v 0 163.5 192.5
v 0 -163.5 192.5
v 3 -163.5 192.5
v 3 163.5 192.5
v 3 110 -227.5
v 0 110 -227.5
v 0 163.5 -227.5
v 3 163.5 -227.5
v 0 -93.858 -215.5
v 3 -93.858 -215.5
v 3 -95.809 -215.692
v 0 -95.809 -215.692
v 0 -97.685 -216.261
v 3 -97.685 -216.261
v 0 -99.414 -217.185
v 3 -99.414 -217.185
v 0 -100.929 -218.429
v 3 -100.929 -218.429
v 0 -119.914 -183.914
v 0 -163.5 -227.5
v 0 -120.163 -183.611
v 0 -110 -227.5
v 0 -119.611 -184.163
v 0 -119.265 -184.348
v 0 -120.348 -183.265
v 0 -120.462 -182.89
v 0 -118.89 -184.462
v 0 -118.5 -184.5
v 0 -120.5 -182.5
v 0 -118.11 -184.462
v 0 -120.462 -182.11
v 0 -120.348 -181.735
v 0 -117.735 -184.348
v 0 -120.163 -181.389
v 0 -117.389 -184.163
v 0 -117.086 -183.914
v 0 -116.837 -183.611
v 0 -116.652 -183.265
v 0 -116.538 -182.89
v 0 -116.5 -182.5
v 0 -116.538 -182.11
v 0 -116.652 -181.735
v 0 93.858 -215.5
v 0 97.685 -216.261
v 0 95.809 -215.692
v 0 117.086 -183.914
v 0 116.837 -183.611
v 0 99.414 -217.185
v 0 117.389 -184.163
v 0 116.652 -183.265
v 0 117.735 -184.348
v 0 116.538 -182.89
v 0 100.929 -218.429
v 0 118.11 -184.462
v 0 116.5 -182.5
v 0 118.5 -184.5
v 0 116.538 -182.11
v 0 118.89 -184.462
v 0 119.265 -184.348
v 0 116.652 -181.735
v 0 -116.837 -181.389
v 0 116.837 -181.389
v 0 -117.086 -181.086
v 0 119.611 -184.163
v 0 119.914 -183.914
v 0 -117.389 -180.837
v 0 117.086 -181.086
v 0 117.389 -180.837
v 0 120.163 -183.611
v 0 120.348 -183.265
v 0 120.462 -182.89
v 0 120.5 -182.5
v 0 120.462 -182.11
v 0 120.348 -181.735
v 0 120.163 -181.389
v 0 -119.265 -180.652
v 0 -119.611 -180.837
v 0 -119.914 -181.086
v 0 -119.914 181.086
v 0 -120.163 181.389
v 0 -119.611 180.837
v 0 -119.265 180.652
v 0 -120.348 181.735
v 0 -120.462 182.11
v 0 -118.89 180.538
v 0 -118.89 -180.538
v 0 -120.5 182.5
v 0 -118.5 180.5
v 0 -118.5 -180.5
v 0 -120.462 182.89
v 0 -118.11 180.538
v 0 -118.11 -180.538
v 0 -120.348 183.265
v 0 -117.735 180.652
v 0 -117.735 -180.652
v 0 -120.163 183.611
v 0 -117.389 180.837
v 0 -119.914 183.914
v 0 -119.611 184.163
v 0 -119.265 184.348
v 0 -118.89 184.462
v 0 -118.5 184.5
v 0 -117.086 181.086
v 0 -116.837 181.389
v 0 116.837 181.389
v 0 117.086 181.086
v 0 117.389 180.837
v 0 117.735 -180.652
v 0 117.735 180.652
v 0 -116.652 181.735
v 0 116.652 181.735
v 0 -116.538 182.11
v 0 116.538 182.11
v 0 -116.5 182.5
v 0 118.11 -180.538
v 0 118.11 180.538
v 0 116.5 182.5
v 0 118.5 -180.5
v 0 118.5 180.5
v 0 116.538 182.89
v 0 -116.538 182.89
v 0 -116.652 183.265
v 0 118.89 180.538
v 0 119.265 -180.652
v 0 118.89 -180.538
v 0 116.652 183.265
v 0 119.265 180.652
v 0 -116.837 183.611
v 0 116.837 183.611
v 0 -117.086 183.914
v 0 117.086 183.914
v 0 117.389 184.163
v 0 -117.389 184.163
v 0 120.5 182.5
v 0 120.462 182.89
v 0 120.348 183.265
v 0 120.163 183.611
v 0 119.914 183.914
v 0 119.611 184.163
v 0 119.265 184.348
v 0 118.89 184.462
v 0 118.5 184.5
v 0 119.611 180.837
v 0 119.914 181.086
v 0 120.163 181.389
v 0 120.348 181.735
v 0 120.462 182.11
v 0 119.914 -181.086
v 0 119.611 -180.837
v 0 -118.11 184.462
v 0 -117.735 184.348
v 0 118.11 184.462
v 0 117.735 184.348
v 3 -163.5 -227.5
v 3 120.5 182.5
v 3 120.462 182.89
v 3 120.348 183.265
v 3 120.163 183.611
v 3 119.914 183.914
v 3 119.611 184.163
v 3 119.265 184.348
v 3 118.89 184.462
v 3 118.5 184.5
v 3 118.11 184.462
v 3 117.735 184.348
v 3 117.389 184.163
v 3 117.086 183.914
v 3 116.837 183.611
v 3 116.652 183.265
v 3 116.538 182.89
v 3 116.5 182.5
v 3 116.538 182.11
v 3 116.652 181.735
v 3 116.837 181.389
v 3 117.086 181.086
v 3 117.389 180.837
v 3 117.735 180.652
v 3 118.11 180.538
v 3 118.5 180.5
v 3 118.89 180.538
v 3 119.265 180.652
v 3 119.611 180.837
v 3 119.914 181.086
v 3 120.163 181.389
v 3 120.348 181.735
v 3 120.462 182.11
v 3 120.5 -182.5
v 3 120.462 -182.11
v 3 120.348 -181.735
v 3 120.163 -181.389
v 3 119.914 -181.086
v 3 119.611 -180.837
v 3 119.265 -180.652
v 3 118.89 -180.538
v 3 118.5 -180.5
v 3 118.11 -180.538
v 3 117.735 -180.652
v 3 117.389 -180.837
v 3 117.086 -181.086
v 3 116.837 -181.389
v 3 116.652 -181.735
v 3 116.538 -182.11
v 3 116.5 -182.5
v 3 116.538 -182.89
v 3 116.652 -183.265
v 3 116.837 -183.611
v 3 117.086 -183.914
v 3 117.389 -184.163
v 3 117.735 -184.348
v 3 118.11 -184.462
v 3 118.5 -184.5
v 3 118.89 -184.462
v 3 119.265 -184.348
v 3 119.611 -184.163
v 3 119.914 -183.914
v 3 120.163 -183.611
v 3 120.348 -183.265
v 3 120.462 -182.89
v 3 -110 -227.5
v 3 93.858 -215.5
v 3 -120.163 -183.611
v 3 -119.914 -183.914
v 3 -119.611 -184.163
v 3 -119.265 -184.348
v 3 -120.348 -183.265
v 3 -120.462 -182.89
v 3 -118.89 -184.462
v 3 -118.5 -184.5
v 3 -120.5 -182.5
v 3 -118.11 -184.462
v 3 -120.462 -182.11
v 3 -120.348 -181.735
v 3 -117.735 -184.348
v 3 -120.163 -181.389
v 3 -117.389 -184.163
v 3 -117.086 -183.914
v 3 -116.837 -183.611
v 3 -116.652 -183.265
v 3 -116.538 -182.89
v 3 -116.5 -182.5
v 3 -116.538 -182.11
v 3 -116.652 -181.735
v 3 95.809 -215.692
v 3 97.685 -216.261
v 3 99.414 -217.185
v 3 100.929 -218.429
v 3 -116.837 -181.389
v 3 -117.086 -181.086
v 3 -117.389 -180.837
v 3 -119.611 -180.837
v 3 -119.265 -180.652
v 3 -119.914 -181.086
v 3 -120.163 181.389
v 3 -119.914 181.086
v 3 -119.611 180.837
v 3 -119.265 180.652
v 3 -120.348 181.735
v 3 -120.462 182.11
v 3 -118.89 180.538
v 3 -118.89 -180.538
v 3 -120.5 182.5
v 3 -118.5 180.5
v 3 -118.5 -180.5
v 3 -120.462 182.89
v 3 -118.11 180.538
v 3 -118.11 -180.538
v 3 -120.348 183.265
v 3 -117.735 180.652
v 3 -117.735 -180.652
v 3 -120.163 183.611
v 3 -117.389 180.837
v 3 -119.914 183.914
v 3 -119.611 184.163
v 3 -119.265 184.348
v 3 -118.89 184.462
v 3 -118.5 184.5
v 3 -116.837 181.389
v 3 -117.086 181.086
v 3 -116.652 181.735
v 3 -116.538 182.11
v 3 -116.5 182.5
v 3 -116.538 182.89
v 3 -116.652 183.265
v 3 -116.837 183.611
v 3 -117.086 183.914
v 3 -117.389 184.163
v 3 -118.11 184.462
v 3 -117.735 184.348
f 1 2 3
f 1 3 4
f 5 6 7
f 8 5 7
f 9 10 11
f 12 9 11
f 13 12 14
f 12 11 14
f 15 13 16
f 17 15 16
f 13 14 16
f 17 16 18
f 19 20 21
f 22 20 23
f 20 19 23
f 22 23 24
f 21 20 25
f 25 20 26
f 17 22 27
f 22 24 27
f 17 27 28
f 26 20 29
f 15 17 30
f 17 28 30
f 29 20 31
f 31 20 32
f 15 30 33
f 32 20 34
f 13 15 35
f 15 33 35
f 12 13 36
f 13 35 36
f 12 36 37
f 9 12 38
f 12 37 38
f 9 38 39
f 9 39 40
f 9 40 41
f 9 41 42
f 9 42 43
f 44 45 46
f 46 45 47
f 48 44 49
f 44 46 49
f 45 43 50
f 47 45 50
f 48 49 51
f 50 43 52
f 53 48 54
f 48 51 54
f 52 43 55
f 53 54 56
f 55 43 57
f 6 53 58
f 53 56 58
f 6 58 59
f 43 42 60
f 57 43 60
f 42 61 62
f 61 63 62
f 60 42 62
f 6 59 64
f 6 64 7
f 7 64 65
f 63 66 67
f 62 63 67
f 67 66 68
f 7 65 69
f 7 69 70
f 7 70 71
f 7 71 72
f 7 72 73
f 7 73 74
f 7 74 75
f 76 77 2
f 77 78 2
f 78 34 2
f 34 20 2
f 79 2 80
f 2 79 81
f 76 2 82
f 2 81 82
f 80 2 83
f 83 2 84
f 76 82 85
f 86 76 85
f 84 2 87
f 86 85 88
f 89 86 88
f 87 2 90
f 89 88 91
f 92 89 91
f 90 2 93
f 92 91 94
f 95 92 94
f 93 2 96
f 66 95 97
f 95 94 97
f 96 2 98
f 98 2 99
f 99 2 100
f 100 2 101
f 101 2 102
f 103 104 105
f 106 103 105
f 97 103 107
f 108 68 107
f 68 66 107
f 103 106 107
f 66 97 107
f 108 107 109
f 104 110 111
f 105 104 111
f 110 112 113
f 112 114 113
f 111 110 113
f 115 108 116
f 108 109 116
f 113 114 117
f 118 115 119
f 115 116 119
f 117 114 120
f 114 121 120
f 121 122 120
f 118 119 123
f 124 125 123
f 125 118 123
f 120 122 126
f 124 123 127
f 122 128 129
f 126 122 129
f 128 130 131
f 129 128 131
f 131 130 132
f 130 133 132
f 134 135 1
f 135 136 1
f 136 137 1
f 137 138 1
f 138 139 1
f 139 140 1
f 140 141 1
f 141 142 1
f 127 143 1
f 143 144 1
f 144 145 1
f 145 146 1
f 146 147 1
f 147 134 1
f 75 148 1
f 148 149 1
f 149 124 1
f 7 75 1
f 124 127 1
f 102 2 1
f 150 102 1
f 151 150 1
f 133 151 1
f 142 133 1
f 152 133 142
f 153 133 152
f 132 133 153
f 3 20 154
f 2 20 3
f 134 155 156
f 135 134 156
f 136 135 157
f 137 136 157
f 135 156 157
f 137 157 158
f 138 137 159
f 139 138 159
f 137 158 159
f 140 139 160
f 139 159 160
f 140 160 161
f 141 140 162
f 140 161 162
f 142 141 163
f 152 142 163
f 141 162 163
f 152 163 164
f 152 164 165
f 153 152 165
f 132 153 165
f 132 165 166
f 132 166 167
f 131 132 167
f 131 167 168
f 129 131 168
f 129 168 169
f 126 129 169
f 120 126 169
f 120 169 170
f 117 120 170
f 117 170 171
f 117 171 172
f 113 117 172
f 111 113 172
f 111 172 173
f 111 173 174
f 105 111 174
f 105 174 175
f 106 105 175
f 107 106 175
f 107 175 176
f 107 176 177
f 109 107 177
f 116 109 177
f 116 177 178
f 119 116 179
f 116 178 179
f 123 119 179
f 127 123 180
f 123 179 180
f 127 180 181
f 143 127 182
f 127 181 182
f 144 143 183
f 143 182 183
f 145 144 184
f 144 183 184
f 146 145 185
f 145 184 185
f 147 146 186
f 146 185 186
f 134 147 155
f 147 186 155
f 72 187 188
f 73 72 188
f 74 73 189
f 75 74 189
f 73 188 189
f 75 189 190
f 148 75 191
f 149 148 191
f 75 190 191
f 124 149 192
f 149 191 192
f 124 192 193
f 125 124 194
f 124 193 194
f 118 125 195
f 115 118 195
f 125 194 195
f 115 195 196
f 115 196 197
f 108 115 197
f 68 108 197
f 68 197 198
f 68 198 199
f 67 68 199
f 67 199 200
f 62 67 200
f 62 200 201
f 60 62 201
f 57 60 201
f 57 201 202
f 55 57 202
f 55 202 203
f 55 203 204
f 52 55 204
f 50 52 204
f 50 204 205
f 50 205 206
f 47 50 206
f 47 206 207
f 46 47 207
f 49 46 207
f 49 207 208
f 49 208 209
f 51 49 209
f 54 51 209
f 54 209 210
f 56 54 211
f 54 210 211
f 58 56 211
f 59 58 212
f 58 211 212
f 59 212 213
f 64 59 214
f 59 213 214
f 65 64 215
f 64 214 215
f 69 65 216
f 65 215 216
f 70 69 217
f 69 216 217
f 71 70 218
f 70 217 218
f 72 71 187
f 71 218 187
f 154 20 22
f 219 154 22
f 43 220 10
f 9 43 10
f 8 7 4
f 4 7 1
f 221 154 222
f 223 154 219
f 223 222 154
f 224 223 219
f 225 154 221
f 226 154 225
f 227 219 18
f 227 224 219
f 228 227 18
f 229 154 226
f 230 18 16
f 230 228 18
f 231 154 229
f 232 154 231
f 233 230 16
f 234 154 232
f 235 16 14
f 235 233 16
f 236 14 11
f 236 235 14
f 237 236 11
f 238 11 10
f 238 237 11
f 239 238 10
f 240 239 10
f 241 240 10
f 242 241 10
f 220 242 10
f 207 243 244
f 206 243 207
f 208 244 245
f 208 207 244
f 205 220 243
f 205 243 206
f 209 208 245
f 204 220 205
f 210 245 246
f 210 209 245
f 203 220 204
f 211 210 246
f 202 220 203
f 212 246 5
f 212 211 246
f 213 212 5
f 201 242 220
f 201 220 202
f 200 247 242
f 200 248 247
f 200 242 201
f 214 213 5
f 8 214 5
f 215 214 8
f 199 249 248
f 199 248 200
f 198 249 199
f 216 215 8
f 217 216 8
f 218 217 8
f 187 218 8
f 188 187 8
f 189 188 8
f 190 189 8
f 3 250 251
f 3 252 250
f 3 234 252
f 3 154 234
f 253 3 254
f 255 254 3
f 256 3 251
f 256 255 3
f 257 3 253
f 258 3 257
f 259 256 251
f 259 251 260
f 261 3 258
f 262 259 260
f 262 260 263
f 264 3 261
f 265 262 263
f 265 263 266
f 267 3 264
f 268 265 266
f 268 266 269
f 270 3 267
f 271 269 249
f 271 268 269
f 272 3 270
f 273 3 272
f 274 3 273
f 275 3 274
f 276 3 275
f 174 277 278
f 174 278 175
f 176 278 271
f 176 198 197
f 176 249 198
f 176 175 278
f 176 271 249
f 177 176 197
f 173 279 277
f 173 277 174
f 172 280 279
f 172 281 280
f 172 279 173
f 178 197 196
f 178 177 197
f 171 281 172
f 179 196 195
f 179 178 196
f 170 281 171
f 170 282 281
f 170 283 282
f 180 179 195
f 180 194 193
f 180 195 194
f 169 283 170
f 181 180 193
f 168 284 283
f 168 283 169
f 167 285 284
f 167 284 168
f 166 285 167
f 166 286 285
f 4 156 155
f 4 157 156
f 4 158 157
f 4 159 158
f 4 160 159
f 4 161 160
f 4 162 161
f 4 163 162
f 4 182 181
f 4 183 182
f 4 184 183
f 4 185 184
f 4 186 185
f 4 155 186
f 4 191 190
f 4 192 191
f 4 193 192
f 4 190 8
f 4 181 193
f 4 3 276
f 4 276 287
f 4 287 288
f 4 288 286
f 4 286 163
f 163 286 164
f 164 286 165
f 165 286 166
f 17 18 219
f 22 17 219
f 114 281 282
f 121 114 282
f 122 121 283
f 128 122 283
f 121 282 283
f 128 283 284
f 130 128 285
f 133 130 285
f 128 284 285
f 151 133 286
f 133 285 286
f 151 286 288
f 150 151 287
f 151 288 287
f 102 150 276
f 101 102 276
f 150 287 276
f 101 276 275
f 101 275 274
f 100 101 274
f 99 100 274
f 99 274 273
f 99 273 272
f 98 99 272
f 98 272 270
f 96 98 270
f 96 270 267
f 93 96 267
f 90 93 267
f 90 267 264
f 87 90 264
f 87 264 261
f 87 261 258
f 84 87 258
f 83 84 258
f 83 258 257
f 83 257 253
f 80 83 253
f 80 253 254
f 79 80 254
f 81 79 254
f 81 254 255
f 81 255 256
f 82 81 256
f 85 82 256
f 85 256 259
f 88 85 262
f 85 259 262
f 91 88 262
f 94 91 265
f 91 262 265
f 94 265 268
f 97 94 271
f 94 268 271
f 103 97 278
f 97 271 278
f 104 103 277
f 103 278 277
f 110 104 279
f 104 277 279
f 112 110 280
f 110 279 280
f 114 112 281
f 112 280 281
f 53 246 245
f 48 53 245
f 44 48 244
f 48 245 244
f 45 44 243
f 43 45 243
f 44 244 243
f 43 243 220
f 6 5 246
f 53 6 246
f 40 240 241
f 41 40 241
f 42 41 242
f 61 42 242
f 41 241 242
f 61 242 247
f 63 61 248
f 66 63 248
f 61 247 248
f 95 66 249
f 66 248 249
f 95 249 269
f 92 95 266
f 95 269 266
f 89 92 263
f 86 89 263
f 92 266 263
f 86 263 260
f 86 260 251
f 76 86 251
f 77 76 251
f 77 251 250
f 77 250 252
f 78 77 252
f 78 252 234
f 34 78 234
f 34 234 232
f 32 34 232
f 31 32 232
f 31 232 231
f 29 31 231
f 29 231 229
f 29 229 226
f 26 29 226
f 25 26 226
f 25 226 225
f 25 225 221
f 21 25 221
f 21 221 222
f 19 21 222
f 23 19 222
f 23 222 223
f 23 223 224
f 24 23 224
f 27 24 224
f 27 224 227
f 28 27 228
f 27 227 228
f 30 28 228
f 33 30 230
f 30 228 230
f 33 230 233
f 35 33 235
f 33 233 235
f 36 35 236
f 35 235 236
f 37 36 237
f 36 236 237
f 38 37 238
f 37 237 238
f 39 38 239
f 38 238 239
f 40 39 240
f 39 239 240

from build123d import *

# Parameters (mm, degrees)
SKETCH_W        = 327
SKETCH_H        = 420
PAD_DEPTH       = 3
SKETCH001_R     = 2
POCKET_DEPTH    = 3.001
POCKET001_DEPTH = 3.001


with BuildPart() as part:
    # Sketch → Pad (new body)
    with BuildSketch(Plane.YZ):
        with Locations((0, -17.5)):
            Rectangle(SKETCH_W, SKETCH_H)
    extrude(amount=PAD_DEPTH)

    # Sketch001 (on Face6 of Pad) → Pocket (cut, through all)
    with BuildSketch(Plane.YZ.offset(3)):
        with Locations((-118.5, 182.5)):
            Circle(SKETCH001_R)
        with Locations((118.5, 182.5)):
            Circle(SKETCH001_R)
        with Locations((-118.5, -182.5)):
            Circle(SKETCH001_R)
        with Locations((118.5, -182.5)):
            Circle(SKETCH001_R)
    extrude(amount=-POCKET_DEPTH, mode=Mode.SUBTRACT)

    # Sketch002 (on Face5 of Pocket) → Pocket001 (cut, through all)
    with BuildSketch(Plane.YZ.offset(3)):
        with BuildLine():
            Line((-110, -227.5), (110, -227.5))
            Line((110, -227.5), (100.928932, -218.428932))
            ThreePointArc((100.928932, -218.428932), (97.684699, -216.261205), (93.857864, -215.5))
            Line((93.857864, -215.5), (-93.857864, -215.5))
            ThreePointArc((-93.857864, -215.5), (-97.684699, -216.261205), (-100.928932, -218.428932))
            Line((-100.928932, -218.428932), (-110, -227.5))
        make_face()
    extrude(amount=-POCKET001_DEPTH, mode=Mode.SUBTRACT)


solid = part.part
